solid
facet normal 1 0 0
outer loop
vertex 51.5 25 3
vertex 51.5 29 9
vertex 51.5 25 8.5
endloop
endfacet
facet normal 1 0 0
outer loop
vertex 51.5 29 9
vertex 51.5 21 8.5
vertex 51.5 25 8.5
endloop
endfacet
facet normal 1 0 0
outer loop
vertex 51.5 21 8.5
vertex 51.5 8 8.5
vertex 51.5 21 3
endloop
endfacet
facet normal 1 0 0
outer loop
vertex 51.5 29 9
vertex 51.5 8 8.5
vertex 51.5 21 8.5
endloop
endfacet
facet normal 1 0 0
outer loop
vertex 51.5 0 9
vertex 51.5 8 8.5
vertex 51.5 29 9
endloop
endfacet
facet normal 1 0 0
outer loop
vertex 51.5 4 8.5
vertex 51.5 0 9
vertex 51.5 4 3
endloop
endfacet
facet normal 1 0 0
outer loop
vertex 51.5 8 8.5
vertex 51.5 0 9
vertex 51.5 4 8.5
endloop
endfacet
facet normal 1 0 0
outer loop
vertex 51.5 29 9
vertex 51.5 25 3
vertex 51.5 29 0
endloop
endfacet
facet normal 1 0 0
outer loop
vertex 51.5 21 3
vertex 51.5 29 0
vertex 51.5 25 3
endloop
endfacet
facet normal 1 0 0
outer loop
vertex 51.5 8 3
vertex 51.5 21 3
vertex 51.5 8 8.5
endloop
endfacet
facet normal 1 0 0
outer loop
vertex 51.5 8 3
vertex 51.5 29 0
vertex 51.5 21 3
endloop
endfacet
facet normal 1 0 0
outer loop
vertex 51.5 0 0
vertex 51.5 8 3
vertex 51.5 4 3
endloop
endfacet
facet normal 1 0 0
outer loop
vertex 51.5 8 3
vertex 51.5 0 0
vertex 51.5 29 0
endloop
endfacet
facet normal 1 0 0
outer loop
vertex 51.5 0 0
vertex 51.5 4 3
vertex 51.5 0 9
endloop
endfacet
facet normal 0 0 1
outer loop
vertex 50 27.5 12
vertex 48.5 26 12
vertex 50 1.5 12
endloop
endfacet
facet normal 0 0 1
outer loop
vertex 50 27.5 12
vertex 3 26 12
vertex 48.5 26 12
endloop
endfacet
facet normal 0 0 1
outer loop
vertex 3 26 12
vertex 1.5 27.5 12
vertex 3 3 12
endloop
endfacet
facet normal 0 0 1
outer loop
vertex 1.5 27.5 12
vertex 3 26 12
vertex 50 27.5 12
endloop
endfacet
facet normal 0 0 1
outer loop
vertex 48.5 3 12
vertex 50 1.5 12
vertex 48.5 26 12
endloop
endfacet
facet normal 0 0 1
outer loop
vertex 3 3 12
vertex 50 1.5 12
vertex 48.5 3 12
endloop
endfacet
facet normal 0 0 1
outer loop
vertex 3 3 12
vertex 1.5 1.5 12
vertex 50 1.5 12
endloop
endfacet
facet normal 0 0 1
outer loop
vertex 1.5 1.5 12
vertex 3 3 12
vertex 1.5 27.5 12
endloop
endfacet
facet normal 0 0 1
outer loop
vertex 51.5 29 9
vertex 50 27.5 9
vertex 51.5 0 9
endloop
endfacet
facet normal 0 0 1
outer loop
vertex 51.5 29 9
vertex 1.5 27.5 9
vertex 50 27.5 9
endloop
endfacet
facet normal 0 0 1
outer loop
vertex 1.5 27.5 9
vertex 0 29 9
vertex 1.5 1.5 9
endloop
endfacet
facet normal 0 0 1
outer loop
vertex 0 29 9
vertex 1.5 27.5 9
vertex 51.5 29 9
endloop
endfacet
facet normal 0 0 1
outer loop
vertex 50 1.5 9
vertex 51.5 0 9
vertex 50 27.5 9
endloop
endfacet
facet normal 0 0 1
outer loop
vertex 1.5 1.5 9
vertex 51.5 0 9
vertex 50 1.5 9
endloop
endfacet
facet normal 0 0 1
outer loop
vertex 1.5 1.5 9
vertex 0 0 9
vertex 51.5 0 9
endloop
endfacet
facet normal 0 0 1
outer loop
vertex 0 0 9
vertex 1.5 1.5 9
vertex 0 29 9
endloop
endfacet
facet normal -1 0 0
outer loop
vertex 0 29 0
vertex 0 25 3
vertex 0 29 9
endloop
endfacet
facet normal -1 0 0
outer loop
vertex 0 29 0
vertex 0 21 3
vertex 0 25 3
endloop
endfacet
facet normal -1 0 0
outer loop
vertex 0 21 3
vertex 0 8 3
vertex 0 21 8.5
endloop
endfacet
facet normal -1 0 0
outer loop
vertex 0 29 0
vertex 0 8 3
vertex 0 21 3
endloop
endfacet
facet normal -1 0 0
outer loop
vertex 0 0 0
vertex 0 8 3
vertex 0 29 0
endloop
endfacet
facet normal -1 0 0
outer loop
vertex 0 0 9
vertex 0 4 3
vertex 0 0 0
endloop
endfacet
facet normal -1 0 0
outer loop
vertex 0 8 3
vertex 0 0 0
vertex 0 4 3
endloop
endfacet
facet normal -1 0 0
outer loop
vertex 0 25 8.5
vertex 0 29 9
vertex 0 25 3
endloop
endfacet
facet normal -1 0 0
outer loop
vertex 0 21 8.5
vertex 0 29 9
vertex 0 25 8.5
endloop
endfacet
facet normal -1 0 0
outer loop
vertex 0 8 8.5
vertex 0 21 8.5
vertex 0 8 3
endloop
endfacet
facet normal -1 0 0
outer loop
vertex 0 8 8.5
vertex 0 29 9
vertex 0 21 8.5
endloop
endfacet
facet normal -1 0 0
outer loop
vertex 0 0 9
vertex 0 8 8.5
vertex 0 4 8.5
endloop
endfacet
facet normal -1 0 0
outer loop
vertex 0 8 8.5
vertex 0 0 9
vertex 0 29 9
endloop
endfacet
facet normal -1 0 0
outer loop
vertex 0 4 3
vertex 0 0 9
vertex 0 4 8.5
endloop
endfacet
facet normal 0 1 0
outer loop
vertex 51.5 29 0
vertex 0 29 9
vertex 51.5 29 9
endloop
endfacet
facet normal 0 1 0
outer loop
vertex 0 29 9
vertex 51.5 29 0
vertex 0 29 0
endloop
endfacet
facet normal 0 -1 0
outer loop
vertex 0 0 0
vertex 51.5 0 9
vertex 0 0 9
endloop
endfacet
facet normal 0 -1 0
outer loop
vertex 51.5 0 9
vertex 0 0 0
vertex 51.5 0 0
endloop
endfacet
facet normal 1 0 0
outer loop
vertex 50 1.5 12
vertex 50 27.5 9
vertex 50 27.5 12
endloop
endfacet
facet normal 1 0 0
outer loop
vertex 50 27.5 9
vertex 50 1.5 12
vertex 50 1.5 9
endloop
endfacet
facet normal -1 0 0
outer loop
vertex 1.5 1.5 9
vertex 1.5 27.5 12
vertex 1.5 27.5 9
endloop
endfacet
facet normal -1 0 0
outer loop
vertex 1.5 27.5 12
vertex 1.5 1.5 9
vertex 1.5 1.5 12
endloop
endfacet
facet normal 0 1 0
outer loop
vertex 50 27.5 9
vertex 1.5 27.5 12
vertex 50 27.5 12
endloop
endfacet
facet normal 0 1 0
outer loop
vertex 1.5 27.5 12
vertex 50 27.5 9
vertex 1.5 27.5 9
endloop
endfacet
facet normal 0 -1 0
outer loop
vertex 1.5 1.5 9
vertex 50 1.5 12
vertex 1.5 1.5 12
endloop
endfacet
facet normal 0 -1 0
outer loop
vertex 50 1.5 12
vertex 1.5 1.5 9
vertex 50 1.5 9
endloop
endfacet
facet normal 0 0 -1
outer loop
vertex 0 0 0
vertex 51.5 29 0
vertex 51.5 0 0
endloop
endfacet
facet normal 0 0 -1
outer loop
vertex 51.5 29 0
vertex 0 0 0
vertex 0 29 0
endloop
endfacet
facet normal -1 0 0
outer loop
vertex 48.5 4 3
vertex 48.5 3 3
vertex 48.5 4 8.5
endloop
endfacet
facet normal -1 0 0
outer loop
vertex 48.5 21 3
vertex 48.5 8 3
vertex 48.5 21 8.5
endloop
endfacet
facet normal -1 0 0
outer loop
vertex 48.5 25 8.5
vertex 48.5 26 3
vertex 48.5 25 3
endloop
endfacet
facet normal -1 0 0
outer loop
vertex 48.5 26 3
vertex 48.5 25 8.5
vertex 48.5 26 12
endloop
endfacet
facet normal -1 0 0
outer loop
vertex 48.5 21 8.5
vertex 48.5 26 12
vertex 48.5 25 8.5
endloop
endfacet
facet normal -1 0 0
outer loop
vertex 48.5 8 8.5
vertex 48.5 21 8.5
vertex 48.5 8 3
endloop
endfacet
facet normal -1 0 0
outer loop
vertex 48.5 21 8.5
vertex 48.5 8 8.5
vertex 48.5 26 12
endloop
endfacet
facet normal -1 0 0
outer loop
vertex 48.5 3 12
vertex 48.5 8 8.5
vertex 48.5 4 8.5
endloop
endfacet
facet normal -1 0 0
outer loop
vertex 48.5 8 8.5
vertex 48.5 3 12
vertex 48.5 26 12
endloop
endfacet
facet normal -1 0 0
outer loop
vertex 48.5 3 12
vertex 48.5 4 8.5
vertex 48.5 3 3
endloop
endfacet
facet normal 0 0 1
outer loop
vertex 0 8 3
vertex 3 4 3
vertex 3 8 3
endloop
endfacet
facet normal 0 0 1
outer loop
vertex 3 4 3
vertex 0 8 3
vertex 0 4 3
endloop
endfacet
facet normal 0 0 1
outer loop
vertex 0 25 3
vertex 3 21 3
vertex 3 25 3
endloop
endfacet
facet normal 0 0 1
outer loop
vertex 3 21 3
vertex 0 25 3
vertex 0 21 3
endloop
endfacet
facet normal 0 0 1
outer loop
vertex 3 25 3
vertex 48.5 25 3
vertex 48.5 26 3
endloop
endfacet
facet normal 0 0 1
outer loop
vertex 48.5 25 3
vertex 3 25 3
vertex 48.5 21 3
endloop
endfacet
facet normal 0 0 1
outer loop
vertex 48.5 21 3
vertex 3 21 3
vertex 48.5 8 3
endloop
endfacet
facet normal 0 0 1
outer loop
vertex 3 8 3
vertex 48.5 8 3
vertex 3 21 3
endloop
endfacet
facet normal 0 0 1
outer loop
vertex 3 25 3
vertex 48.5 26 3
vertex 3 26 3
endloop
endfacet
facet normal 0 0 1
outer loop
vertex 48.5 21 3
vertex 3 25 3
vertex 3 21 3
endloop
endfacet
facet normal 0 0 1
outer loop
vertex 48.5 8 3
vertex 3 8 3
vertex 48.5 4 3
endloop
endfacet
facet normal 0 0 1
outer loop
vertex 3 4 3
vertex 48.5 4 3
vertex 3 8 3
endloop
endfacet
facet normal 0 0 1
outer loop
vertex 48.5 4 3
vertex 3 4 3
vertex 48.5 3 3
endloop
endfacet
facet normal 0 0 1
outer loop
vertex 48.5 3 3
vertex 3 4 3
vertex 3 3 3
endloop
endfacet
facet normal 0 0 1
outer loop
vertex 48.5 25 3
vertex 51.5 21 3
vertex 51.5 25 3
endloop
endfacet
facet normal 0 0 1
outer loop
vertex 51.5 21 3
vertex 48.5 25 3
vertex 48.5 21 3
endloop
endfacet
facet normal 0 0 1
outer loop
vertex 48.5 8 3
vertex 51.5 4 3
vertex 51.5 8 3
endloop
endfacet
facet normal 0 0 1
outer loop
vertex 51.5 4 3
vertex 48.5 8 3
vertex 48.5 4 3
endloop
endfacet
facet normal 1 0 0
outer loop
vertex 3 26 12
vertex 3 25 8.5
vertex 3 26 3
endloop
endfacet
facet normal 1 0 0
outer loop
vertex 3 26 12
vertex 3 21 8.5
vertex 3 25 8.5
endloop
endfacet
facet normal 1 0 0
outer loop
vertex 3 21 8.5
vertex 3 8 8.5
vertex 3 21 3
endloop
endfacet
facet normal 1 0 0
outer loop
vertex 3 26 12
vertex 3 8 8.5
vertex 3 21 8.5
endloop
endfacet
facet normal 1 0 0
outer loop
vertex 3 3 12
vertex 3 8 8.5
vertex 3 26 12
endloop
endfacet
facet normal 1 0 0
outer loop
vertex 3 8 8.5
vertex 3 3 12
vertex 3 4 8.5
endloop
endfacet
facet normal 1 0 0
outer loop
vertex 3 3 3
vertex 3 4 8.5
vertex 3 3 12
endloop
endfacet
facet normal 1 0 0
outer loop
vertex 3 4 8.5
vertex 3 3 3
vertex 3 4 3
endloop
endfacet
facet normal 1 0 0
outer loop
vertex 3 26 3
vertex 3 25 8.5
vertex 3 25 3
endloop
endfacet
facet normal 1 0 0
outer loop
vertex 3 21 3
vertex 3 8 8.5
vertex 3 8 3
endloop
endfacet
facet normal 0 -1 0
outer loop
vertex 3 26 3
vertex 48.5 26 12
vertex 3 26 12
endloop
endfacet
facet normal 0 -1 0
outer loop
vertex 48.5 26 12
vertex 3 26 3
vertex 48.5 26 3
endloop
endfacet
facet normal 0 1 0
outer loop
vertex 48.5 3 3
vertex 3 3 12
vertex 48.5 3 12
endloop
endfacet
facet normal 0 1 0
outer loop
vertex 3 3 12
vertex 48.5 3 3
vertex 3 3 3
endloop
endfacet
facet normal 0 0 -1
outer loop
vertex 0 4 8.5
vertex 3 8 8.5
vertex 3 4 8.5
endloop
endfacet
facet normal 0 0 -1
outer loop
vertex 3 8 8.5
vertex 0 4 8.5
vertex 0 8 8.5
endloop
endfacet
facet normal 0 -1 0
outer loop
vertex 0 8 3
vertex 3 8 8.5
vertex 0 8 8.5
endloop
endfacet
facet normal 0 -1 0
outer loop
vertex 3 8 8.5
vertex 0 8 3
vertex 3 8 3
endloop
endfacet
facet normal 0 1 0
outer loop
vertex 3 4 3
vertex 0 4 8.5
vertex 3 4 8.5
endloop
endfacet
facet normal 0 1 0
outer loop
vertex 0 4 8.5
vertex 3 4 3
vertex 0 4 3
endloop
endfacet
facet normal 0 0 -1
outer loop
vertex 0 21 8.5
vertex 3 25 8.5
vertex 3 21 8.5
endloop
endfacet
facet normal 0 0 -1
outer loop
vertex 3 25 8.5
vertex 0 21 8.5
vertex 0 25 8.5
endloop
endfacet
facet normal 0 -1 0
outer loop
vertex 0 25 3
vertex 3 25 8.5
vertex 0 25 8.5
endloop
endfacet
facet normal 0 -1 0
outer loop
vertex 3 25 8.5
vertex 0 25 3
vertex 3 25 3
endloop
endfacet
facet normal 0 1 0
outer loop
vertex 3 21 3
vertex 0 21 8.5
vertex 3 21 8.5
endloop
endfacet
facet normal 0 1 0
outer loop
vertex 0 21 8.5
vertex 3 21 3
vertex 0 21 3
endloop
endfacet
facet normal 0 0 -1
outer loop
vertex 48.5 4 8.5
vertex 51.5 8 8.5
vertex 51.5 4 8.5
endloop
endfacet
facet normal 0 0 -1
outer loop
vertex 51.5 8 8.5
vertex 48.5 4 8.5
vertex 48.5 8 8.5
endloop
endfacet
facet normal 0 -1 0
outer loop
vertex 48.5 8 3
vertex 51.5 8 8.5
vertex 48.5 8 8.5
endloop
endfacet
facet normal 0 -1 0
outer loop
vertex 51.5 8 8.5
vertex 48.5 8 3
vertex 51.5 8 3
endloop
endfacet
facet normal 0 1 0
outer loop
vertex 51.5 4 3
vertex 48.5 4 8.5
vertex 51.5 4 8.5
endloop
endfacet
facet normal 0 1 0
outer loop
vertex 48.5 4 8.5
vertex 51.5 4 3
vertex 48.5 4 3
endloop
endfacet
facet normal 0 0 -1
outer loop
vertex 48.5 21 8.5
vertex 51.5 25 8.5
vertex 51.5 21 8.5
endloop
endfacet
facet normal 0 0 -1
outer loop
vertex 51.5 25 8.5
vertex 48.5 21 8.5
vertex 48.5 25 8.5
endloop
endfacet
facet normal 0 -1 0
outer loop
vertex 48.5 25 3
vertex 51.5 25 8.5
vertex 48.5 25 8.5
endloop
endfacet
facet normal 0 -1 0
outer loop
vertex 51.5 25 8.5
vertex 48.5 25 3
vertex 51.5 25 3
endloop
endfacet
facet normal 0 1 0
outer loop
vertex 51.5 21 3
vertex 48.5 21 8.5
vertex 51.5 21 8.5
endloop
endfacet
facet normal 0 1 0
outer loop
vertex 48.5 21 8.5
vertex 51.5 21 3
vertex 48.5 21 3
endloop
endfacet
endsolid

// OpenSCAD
// Boks LM2596-basert buck-converter

debug = true;
idiot = $preview ? .5 : 0;
fn = $preview ? 12 : 31;

board_x = 43.5;
board_y = 21;
ol_height = 3; // overlapp
b_height = 9;
t_height = 13.5-b_height; // bare skruen stikker ut
walls = 3;
gap = 1;
bottom = 3;
hole_r = 1.5;
lh_width = 4; // lead hole
lh_height = 5.5; // lead hole

difference() {
    cube([board_x+walls*2+gap*2,board_y+walls*2+gap*2,b_height+bottom]);
    translate([walls,walls,bottom]) {
        cube([board_x+gap*2,board_y+gap*2,b_height+idiot]);
    }
    translate([0,0,bottom+b_height-ol_height]) {
        difference() {
            cube([board_x+walls*2+gap*2,board_y+walls*2+gap*2,ol_height]);
            translate([walls/2,walls/2,0]) {
                cube([board_x+walls+gap*2,board_y+walls+gap*2,ol_height]);
            }
        }
    }
    translate([0,walls+gap,bottom]) {
        cube([walls,lh_width,lh_height]);
    }
    translate([0,walls+board_y-lh_width+gap,bottom]) {
        cube([walls,lh_width,lh_height]);
    }
    translate([walls+board_x+gap*2,walls+gap,bottom]) {
        cube([walls,lh_width,lh_height]);
    }
    translate([walls+board_x+gap*2,walls+board_y-lh_width+gap,bottom]) {
        cube([walls,lh_width,lh_height]);
    }
}

    
    /*
    translate([(walls+walls/2+3), walls+walls/2+3,-idiot], $fn=fn) {
        cylinder(r=hole_r,h=bottom+idiot*2);
    }
    translate([board_x-(walls-walls/2-3),(walls+walls/2+3),-idiot], $fn=fn) {
        cylinder(r=hole_r,h=bottom+idiot*2);
    }
    translate([(walls+walls/2+3),board_y-(walls-3),-idiot], $fn=fn) {
        cylinder(r=hole_r,h=bottom+idiot*2);
    }
    translate([board_x-walls+3,board_y-(walls-3),-idiot], $fn=fn) {
        cylinder(r=hole_r,h=bottom+idiot*2);
    }
    */
